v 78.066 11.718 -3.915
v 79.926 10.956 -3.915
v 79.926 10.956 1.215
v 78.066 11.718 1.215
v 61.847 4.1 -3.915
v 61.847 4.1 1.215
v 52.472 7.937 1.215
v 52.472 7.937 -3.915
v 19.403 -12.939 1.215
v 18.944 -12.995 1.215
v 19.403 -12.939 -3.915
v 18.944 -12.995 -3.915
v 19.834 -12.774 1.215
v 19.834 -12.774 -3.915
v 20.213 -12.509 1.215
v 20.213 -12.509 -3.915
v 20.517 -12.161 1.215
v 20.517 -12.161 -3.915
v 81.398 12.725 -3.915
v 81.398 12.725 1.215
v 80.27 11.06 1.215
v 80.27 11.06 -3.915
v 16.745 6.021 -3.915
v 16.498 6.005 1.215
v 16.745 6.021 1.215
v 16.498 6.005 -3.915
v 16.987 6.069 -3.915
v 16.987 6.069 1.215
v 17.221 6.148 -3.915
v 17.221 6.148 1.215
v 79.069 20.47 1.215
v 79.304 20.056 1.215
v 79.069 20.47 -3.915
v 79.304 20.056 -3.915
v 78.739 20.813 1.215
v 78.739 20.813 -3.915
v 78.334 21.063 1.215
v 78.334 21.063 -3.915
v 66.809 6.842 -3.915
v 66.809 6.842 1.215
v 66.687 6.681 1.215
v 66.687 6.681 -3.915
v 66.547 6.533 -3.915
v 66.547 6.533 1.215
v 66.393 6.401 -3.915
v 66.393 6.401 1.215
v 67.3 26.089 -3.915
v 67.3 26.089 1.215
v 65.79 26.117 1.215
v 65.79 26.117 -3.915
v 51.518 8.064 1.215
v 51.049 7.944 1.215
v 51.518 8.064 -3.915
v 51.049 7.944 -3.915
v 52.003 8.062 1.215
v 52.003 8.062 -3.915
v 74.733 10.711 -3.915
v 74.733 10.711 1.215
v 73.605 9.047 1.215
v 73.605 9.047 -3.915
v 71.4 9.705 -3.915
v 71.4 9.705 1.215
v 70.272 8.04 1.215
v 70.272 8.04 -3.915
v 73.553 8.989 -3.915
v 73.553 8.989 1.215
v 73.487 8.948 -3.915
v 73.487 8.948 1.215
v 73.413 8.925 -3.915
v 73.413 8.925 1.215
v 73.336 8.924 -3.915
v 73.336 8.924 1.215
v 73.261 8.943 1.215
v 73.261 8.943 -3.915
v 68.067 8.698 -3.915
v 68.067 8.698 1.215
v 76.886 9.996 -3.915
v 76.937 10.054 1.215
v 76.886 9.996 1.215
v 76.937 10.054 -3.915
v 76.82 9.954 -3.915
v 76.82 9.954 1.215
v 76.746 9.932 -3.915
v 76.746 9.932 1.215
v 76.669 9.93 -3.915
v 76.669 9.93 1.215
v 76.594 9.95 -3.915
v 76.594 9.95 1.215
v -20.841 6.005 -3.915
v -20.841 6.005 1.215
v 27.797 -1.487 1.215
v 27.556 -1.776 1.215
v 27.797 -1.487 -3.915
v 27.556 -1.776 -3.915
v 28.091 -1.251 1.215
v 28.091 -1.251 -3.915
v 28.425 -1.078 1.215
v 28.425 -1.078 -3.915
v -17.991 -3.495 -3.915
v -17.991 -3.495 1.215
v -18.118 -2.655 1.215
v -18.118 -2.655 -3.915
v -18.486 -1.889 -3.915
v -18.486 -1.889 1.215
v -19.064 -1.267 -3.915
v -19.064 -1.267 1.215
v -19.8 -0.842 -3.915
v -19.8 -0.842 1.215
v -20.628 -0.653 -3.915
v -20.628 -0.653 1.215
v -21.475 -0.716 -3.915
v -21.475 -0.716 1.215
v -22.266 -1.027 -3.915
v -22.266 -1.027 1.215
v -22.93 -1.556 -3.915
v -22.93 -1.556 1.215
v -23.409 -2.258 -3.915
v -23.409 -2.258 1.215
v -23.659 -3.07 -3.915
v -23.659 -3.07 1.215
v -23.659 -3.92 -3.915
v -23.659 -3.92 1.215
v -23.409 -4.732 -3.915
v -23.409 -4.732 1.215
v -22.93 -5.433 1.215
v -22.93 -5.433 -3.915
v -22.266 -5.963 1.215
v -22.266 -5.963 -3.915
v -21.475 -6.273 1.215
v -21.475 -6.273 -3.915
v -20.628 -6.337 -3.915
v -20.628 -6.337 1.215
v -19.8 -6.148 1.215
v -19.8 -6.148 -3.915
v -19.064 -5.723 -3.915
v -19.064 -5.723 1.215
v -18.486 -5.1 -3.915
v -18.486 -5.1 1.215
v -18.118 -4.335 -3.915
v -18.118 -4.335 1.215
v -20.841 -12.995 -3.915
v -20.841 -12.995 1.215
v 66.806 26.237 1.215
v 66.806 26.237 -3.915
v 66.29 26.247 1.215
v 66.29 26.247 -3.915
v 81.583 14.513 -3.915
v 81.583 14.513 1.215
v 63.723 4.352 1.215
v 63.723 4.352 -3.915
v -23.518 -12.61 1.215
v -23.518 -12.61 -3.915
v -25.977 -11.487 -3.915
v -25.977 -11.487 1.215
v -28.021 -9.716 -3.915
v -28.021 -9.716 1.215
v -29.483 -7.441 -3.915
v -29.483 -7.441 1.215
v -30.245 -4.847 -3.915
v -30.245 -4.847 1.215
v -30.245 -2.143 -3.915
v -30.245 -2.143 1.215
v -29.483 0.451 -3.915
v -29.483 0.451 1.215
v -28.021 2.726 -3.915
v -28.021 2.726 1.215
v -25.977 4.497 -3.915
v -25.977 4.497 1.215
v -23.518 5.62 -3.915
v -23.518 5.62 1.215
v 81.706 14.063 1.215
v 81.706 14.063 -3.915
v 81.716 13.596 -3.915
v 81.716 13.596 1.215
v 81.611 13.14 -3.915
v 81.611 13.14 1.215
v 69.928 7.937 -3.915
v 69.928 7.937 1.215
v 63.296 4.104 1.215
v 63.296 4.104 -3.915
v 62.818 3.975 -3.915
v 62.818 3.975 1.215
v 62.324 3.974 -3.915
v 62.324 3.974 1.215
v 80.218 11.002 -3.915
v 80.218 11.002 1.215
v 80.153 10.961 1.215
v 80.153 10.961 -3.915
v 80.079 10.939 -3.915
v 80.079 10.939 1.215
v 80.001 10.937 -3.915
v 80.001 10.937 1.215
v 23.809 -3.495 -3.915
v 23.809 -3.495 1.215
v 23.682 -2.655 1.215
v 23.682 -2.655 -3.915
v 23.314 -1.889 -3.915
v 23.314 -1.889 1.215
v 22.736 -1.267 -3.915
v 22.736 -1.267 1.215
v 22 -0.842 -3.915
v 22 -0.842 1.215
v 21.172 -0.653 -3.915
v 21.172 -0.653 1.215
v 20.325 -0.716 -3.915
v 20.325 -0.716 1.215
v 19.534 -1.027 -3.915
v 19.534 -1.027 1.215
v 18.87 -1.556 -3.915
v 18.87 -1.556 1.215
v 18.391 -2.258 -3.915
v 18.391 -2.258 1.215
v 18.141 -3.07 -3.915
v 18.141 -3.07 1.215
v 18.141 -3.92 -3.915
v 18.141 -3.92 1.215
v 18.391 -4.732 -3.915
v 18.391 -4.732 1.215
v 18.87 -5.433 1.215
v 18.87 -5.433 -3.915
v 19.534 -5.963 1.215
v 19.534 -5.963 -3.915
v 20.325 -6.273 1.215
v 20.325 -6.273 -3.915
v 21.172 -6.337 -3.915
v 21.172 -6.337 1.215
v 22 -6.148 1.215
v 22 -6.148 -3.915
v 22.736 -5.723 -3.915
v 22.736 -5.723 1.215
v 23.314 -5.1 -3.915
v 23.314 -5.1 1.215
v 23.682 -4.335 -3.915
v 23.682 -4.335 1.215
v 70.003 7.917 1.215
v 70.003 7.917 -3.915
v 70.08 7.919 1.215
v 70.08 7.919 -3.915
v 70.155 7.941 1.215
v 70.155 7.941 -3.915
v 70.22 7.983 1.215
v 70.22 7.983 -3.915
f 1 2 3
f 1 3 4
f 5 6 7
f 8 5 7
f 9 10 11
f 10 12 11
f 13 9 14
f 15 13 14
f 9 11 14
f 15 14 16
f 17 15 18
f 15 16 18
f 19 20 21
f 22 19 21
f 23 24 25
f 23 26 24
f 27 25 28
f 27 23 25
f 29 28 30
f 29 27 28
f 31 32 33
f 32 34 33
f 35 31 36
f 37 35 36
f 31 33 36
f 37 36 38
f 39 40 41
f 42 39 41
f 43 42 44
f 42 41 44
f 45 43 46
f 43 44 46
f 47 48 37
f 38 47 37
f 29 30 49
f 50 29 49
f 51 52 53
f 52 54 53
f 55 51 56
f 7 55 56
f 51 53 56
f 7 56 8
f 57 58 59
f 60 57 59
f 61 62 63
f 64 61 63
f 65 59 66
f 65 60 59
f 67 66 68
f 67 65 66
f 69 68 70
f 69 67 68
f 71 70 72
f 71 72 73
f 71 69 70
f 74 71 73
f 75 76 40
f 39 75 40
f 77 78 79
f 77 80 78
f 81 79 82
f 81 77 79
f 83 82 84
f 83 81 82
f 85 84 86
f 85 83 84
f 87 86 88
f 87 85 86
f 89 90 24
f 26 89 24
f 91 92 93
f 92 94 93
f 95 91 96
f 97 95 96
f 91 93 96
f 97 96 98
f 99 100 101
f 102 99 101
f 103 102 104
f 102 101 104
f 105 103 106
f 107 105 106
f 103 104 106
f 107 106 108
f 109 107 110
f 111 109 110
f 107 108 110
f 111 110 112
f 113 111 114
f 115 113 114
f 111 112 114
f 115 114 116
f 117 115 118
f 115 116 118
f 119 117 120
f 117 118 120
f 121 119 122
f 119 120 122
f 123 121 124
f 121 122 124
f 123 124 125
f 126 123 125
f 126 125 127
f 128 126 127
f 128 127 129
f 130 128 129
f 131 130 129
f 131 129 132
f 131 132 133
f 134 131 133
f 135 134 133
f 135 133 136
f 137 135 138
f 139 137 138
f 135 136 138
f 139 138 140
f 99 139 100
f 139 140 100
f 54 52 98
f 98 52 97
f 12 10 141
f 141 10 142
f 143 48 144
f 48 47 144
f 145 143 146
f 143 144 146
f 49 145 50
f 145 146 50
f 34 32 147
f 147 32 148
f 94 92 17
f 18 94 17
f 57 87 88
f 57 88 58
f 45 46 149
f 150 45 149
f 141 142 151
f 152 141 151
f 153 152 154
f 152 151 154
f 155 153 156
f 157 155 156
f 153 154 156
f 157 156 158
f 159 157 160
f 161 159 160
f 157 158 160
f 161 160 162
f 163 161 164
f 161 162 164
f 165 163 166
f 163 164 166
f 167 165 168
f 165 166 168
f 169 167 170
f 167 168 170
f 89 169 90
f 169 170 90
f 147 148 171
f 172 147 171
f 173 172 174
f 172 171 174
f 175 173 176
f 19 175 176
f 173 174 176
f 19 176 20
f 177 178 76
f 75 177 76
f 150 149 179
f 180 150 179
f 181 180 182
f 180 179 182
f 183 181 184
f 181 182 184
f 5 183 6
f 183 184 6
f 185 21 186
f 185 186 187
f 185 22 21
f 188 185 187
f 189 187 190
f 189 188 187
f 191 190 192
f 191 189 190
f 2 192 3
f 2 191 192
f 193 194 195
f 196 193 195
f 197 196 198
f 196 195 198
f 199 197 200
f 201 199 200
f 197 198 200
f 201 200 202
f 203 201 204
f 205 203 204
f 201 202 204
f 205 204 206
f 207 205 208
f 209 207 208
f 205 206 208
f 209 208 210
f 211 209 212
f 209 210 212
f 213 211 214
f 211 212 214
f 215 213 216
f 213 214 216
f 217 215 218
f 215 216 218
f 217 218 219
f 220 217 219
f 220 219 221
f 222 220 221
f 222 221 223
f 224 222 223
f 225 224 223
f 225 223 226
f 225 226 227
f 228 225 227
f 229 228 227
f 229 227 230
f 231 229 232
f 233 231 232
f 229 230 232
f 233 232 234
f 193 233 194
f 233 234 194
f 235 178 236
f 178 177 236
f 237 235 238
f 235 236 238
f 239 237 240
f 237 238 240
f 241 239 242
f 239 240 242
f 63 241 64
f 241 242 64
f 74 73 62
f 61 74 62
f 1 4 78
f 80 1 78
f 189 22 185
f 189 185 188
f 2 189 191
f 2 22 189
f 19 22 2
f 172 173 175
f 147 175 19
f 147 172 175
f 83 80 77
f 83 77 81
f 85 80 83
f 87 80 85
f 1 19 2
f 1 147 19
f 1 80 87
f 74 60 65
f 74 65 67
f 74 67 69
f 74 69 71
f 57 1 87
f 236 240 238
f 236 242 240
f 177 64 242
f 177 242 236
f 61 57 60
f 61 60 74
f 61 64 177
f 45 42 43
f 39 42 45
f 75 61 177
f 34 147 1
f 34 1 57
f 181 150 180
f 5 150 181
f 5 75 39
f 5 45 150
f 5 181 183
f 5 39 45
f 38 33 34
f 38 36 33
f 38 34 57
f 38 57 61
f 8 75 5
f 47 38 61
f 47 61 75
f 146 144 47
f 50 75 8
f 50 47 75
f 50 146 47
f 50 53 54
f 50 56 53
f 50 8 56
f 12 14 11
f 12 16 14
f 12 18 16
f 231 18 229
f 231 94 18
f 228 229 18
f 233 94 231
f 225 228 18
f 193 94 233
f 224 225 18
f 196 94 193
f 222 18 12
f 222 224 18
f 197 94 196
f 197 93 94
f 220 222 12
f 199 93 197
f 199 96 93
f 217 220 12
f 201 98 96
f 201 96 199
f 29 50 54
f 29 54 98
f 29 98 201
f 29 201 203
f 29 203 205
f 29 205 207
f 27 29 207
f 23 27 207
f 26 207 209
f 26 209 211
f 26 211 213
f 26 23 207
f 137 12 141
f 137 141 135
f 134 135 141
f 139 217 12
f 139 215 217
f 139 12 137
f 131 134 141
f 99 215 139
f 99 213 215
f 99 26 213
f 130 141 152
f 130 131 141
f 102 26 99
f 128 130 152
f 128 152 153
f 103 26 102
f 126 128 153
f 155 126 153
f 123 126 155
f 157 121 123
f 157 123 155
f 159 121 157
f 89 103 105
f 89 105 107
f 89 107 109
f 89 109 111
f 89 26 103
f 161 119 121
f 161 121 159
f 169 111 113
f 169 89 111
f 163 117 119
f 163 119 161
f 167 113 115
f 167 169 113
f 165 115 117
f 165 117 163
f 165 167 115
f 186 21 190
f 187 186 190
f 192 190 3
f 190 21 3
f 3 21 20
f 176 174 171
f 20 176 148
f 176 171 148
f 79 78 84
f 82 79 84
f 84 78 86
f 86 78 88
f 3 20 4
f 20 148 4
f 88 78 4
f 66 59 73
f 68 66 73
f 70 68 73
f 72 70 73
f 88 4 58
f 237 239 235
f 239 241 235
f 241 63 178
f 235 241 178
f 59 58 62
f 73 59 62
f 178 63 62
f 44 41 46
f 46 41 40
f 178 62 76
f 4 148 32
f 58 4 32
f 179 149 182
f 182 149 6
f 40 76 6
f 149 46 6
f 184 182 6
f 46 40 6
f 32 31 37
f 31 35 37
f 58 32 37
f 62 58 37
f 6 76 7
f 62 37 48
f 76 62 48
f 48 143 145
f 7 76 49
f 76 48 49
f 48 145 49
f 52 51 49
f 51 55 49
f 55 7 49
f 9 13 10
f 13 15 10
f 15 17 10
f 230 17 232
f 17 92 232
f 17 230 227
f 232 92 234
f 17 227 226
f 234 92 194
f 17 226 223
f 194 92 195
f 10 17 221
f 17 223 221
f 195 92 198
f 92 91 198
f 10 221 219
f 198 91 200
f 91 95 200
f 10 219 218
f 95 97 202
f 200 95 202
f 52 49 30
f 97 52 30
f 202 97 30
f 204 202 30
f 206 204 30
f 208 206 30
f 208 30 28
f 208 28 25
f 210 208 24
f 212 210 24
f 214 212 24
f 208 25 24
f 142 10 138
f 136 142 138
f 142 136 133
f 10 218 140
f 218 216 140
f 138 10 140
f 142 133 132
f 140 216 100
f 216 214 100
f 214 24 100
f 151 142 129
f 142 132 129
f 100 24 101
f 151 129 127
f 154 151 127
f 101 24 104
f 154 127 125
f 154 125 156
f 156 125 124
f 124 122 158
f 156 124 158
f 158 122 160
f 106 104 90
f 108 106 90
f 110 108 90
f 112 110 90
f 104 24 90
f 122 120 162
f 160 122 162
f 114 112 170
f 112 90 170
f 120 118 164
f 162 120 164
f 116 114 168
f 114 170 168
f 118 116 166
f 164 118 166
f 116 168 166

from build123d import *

# Parameters (mm, degrees)
SKETCH1_R           = 1.5
BOSS_EXTRUDE1_DEPTH = 2.7
FILLET1_R           = 0.15
FILLET2_R           = 1
FILLET3_R           = 1
FILLET4_R           = 1
SCALE1_SCALE        = 1.9


with BuildPart() as part:
    # Sketch1 → Boss-Extrude1 (new body)
    with BuildSketch(Plane.XY):
        with BuildLine():
            Line((0, 5), (19.85, 5))
            Line((19.85, 5), (45.99619398, 15.75))
            Line((45.99619398, 15.75), (52.557536486, 12.761206845))
            Line((52.557536486, 12.761206845), (53.907471601, 9.477889135))
            ThreePointArc((53.907471601, 9.477889135), (53.977314115, 8.995006796), (53.810360044, 8.536553233))
            Line((53.810360044, 8.536553233), (53.148294507, 7.559788561))
            Line((53.148294507, 7.559788561), (52.056234711, 8.006784537))
            Line((52.056234711, 8.006784537), (51.394169174, 7.030019865))
            Line((51.394169174, 7.030019865), (50.302109378, 7.477015841))
            Line((50.302109378, 7.477015841), (49.640043841, 6.500251169))
            Line((49.640043841, 6.500251169), (48.547984045, 6.947247144))
            Line((48.547984045, 6.947247144), (47.885918508, 5.970482472))
            Line((47.885918508, 5.970482472), (46.793858712, 6.417478448))
            Line((46.793858712, 6.417478448), (46.131793175, 5.440713776))
            ThreePointArc((46.131793175, 5.440713776), (46.03170075, 5.315863389), (45.912975416, 5.208576821))
            Line((45.912975416, 5.208576821), (44.507662892, 4.129714813))
            ThreePointArc((44.507662892, 4.129714813), (44.031433487, 3.93177062), (43.519903831, 3.997449854))
            Line((43.519903831, 3.997449854), (38.212047423, 6.170032768))
            Line((38.212047423, 6.170032768), (25.644379319, 1.158584034))
            Line((25.644379319, 1.158584034), (21.47, -5))
            Line((21.47, -5), (0, -5))
            ThreePointArc((0, -5), (-5, 0), (0, 5))
        make_face()
        Circle(SKETCH1_R, mode=Mode.SUBTRACT)
        with Locations((22, 0)):
            Circle(SKETCH1_R, mode=Mode.SUBTRACT)
    extrude(amount=-BOSS_EXTRUDE1_DEPTH)

    # Fillet1
    fillet1_edges = [part.edges().sort_by_distance(p)[0] for p in [
        (53.148294507, 7.559788561, -1.35),
        (51.394169174, 7.030019865, -1.35),
        (49.640043841, 6.500251169, -1.35),
        (47.885918508, 5.970482472, -1.35),
    ]]
    fillet(fillet1_edges, radius=FILLET1_R)

    # Fillet2
    fillet2_edges = [part.edges().sort_by_distance(p)[0] for p in [
        (21.47, -5, -1.35),
        (45.99619398, 15.75, -1.35),
        (52.557536486, 12.761206845, -1.35),
    ]]
    fillet(fillet2_edges, radius=FILLET2_R)

    # Fillet3
    fillet3_edges = [part.edges().sort_by_distance(p)[0] for p in [
        (38.212047423, 6.170032768, -1.35),
        (25.644379319, 1.158584034, -1.35),
    ]]
    fillet(fillet3_edges, radius=FILLET3_R)

    # Fillet4
    fillet4_edges = [part.edges().sort_by_distance(p)[0] for p in [
        (19.85, 5, -1.35),
    ]]
    fillet(fillet4_edges, radius=FILLET4_R)


with BuildPart() as part_1:
    # Scale1: scaled about (23.156973948, 3.883277681, -1.35)
    add(part.part.scale(SCALE1_SCALE).moved(Location((-20.841276553, -3.494949913, 1.215))))


solid = part_1.part
